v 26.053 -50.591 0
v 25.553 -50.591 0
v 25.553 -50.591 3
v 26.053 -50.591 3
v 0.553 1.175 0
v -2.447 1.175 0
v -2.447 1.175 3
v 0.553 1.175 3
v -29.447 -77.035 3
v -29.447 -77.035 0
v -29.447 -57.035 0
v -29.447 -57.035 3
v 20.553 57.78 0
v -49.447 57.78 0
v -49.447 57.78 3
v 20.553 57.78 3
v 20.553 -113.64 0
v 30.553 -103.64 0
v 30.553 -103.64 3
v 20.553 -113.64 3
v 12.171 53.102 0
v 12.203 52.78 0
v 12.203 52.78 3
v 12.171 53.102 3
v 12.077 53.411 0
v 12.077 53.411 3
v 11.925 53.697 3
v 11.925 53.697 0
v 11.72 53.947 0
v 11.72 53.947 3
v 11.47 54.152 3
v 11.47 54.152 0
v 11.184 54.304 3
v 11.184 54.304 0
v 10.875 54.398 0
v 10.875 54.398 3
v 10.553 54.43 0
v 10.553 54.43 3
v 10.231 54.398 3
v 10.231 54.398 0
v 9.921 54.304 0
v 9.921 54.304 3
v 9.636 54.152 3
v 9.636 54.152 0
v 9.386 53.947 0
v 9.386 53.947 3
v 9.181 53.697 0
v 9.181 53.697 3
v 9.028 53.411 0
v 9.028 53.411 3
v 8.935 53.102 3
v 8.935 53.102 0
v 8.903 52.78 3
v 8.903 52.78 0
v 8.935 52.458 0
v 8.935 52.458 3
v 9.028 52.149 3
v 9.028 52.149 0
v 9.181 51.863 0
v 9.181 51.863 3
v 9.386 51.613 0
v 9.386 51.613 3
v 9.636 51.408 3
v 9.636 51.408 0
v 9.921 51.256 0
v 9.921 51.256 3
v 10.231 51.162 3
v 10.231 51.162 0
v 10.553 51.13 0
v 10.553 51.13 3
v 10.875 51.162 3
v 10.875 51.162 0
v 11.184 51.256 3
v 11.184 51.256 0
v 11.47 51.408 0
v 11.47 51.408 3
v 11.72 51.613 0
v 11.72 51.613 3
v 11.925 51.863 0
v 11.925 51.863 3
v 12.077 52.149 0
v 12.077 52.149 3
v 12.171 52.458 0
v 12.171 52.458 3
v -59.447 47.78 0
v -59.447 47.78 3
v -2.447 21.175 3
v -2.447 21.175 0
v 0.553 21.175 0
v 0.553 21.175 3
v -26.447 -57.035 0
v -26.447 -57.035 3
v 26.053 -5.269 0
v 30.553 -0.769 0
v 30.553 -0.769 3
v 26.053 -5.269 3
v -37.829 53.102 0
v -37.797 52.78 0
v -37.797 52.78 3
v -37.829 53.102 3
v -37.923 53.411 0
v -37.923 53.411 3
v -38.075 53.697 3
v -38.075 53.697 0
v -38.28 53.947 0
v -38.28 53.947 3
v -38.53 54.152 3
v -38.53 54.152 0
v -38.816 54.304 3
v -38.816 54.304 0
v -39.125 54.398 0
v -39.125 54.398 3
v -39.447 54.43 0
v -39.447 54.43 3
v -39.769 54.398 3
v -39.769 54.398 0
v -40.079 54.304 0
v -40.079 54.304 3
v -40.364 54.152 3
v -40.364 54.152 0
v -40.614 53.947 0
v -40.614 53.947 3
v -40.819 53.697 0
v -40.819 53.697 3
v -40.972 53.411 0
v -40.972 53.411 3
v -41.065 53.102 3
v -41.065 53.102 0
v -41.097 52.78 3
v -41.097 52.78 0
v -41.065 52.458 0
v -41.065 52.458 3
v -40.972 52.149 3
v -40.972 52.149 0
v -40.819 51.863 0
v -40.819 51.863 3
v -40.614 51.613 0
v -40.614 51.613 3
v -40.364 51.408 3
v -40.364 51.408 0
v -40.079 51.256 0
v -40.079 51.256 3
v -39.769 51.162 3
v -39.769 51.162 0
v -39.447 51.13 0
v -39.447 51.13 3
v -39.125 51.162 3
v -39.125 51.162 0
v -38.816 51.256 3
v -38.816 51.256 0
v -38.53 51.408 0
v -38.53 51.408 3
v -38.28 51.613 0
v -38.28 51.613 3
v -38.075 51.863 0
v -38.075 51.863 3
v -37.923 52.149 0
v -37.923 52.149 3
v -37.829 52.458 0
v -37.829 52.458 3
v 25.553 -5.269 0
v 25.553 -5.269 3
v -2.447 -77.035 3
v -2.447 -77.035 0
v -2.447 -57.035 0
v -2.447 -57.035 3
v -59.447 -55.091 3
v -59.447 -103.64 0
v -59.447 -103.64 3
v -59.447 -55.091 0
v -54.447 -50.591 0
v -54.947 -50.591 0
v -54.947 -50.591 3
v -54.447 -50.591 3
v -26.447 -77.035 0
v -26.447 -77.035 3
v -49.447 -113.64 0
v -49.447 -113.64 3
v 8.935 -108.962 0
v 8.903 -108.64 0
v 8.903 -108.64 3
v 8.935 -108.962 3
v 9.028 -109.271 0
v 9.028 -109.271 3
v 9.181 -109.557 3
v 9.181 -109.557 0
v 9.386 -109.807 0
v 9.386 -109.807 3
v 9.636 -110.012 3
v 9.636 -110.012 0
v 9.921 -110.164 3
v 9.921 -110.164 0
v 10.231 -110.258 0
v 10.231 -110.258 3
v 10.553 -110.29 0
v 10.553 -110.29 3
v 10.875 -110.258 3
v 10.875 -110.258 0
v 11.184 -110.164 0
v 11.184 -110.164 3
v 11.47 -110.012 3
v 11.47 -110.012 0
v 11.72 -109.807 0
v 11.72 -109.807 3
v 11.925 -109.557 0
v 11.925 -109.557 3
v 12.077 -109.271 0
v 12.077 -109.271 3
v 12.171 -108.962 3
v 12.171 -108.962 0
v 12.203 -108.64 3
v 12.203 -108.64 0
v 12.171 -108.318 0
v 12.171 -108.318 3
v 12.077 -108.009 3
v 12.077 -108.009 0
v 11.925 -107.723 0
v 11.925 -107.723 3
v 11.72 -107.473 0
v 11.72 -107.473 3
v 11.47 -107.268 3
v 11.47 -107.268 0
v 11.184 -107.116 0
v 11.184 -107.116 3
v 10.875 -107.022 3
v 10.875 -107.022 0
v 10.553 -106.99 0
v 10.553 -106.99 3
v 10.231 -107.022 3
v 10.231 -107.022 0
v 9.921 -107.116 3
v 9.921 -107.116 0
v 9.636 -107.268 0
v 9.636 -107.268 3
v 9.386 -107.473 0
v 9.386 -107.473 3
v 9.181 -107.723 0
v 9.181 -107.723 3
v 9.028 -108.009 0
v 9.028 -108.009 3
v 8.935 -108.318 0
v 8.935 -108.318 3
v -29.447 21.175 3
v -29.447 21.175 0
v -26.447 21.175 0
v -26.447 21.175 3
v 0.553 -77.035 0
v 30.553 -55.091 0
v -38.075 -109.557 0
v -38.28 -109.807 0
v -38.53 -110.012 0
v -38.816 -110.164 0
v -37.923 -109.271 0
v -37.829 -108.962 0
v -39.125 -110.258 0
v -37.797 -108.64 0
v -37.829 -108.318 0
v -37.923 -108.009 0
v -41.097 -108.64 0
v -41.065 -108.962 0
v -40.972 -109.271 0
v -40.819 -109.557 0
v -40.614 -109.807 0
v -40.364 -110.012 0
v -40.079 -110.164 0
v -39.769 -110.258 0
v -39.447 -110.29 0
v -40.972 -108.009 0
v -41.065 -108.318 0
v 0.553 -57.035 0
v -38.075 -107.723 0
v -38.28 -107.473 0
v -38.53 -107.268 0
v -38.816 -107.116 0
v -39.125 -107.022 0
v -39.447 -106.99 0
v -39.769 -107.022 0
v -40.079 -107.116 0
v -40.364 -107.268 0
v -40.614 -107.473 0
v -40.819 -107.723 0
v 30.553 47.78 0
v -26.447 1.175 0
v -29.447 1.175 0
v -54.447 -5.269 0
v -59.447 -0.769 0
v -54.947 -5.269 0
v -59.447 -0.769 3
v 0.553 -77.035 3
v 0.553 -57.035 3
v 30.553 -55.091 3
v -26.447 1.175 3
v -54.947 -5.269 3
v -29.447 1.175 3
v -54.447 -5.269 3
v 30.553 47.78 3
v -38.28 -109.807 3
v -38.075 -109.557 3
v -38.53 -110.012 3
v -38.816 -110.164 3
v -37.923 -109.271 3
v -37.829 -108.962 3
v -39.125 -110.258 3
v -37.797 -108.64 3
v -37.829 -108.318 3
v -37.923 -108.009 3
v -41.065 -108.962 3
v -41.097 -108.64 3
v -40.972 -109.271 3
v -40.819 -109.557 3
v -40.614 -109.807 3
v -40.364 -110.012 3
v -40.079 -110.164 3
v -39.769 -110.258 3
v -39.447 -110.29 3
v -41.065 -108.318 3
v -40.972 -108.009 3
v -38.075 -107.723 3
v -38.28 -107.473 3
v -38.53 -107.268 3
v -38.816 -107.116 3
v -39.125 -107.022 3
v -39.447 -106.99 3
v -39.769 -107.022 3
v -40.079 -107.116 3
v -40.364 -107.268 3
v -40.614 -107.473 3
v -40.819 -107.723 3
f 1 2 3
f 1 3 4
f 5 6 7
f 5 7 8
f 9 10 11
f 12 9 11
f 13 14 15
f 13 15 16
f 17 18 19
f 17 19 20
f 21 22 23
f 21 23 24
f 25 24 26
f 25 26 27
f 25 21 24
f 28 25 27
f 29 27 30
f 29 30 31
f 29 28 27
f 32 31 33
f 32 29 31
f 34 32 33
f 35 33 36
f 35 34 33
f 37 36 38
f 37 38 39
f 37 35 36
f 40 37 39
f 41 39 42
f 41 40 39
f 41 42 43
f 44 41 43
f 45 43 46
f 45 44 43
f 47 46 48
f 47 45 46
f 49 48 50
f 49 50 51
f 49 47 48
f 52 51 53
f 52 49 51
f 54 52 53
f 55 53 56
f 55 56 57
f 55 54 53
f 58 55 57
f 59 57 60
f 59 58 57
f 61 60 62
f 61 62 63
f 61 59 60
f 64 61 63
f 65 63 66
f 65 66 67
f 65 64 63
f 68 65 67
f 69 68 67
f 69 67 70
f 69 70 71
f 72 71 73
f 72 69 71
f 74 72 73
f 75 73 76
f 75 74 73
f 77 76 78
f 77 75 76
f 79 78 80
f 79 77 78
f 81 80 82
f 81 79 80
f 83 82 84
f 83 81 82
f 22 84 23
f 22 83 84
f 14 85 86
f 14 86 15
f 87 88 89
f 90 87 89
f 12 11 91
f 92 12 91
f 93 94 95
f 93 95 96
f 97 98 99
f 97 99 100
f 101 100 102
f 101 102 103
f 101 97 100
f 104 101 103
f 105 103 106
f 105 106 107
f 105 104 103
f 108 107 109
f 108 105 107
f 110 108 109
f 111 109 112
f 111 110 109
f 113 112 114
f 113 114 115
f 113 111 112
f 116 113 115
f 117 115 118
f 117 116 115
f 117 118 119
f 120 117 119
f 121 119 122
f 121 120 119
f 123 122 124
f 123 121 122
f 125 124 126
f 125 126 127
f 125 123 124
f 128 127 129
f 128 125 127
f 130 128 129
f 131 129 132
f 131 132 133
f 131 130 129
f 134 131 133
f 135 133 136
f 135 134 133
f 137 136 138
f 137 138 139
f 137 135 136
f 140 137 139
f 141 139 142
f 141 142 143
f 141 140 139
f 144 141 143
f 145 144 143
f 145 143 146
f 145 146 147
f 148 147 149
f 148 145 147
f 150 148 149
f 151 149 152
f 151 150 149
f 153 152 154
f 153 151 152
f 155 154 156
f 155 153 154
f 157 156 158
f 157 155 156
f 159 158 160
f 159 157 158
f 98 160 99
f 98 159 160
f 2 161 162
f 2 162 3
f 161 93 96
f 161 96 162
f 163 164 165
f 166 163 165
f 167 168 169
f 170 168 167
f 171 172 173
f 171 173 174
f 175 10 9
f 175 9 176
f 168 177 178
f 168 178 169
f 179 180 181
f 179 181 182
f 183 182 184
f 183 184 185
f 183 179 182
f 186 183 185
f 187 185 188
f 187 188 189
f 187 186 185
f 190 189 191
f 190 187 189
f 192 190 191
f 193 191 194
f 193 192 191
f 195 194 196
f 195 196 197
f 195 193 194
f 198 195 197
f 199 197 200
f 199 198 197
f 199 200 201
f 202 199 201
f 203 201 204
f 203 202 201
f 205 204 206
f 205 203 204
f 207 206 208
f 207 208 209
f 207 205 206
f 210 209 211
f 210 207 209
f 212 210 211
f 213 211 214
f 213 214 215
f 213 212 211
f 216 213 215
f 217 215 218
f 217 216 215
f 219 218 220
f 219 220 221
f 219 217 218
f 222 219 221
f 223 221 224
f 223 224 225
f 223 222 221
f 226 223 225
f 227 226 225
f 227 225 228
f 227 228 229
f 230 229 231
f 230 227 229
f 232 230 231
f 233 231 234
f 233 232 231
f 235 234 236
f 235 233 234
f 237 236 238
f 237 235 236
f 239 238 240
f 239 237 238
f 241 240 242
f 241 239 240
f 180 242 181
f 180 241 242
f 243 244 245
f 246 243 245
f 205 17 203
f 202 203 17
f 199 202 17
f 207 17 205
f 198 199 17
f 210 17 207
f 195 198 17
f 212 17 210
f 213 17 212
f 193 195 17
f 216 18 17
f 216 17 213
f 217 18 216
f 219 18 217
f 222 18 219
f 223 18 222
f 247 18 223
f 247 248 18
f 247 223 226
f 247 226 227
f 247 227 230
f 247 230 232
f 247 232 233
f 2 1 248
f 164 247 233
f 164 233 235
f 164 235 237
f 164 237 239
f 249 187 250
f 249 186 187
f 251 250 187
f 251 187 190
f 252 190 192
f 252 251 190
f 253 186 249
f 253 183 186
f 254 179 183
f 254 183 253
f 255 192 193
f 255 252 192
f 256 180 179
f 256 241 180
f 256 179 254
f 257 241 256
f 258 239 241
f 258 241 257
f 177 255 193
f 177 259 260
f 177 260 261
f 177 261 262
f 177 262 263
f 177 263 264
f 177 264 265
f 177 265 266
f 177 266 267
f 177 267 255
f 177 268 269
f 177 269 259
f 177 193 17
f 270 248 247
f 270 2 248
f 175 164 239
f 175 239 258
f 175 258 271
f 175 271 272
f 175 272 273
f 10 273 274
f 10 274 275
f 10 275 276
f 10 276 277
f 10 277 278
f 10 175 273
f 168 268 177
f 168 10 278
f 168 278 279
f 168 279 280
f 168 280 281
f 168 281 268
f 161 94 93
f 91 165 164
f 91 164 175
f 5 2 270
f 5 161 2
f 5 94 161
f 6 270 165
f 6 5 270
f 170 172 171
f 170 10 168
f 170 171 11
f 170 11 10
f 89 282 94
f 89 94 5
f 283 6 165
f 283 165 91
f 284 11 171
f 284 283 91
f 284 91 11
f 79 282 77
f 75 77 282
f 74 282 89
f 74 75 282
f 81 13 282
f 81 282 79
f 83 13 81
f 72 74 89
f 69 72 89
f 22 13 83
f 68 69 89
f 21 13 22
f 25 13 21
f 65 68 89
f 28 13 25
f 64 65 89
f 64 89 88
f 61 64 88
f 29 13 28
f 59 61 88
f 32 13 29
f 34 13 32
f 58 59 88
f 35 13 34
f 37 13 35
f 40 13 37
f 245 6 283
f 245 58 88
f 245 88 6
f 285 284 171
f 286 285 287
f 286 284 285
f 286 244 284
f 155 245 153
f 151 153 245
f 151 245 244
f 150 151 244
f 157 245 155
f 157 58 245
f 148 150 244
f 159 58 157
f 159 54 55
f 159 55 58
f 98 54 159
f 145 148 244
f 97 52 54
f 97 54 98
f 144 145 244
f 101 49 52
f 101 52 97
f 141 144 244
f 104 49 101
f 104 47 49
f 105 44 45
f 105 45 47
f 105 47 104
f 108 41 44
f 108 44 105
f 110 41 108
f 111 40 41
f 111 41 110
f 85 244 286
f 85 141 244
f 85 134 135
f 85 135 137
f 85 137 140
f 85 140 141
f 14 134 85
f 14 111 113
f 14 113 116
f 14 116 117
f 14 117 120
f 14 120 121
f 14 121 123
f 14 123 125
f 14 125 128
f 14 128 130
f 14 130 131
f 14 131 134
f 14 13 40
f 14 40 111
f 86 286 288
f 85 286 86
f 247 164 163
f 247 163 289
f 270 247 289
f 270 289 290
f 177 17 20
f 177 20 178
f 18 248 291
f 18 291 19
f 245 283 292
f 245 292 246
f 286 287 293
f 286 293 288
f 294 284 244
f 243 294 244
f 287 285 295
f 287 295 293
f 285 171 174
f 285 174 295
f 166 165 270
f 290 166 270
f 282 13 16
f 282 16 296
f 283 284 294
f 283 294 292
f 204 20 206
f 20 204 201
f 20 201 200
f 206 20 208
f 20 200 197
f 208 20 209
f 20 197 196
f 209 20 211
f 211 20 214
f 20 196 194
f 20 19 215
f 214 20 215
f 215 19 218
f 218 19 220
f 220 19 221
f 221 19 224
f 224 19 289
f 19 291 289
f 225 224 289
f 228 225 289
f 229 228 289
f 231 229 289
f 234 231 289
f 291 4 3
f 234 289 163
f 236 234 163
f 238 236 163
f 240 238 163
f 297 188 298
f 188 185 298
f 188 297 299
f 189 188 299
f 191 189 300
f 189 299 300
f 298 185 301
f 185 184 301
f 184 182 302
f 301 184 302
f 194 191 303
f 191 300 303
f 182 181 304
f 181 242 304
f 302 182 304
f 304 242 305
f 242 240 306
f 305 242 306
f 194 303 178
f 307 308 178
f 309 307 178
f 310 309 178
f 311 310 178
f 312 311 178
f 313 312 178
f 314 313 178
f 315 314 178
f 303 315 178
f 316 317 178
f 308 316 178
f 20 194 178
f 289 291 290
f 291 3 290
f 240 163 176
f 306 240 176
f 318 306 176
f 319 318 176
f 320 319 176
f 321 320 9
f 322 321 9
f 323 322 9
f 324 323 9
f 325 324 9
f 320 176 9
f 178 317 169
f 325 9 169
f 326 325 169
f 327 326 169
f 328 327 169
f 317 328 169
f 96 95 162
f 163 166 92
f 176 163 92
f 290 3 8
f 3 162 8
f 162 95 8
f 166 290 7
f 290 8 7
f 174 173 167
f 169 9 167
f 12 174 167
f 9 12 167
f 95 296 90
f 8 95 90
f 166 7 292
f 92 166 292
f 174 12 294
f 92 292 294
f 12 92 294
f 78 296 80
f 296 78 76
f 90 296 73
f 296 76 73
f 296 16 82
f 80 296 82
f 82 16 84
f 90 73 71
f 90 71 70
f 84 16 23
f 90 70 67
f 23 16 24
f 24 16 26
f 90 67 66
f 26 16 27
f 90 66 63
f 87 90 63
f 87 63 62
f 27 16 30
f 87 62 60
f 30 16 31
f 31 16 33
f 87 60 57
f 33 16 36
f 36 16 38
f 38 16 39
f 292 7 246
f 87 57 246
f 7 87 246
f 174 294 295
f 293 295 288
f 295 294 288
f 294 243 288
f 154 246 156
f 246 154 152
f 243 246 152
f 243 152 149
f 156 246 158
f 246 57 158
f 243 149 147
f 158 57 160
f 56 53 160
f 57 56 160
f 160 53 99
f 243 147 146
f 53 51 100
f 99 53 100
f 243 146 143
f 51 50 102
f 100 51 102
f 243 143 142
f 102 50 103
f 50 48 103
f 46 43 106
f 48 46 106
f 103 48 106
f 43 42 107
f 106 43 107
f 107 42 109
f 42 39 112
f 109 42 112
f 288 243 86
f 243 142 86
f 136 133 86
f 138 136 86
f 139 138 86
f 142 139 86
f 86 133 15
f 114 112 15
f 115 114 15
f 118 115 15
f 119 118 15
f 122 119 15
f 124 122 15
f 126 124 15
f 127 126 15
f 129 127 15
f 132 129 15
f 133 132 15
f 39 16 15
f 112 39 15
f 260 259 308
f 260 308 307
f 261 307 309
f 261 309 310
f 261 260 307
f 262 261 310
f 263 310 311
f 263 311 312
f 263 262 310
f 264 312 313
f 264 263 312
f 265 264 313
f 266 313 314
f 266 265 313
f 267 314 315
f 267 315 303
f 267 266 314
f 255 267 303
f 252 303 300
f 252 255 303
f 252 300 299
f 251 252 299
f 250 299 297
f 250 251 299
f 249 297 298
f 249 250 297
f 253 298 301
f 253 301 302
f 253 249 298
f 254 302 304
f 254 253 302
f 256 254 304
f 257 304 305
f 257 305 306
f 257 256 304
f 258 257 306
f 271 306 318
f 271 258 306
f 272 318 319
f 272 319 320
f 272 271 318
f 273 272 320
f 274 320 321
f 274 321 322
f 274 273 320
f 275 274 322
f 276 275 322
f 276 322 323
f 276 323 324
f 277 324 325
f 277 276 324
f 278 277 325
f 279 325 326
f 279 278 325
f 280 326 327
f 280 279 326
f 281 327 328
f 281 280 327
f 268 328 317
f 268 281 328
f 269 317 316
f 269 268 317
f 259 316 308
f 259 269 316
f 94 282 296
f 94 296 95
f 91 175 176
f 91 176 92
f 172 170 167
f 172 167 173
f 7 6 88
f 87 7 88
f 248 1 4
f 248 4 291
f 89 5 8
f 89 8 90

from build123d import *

# Parameters (mm, degrees)
SKETCH1_R           = 1.65
SKETCH1_W           = 3
SKETCH1_H           = 20
BOSS_EXTRUDE2_DEPTH = 3


with BuildPart() as part:
    # Sketch1 → Boss-Extrude2 (new body)
    with BuildSketch(Plane.XY):
        Polygon((-59.447183423, 47.780041818), (-49.447183423, 57.780041818), (20.552816577, 57.780041818), (30.552816577, 47.780041818), (30.552816577, -0.7691812), (26.052816577, -5.2691812), (25.552816577, -5.2691812), (25.552816577, -50.590735163), (26.052816577, -50.590735163), (30.552816577, -55.090735163), (30.552816577, -103.639958182), (20.552816577, -113.639958182), (-49.447183423, -113.639958182), (-59.447183423, -103.639958182), (-59.447183423, -55.090735163), (-54.947183423, -50.590735163), (-54.447183423, -50.590735163), (-54.447183423, -5.2691812), (-54.947183423, -5.2691812), (-59.447183423, -0.7691812), align=None)
        with Locations((-39.447183423, 52.780041818)):
            Circle(SKETCH1_R, mode=Mode.SUBTRACT)
        with Locations((10.552816577, 52.780041818)):
            Circle(SKETCH1_R, mode=Mode.SUBTRACT)
        with Locations(Location((10.552816577, -108.639958182, 0), (0, 0, 180))):
            Circle(SKETCH1_R, mode=Mode.SUBTRACT)
        with Locations(Location((-39.447183423, -108.639958182, 0), (0, 0, 180))):
            Circle(SKETCH1_R, mode=Mode.SUBTRACT)
        with Locations((-27.947183423, 11.175041818)):
            Rectangle(SKETCH1_W, SKETCH1_H, mode=Mode.SUBTRACT)
        with Locations((-0.947183423, 11.175041818)):
            Rectangle(SKETCH1_W, SKETCH1_H, mode=Mode.SUBTRACT)
        with Locations((-0.947183423, -67.034958182)):
            Rectangle(SKETCH1_W, SKETCH1_H, mode=Mode.SUBTRACT)
        with Locations((-27.947183423, -67.034958182)):
            Rectangle(SKETCH1_W, SKETCH1_H, mode=Mode.SUBTRACT)
    extrude(amount=BOSS_EXTRUDE2_DEPTH)


solid = part.part
